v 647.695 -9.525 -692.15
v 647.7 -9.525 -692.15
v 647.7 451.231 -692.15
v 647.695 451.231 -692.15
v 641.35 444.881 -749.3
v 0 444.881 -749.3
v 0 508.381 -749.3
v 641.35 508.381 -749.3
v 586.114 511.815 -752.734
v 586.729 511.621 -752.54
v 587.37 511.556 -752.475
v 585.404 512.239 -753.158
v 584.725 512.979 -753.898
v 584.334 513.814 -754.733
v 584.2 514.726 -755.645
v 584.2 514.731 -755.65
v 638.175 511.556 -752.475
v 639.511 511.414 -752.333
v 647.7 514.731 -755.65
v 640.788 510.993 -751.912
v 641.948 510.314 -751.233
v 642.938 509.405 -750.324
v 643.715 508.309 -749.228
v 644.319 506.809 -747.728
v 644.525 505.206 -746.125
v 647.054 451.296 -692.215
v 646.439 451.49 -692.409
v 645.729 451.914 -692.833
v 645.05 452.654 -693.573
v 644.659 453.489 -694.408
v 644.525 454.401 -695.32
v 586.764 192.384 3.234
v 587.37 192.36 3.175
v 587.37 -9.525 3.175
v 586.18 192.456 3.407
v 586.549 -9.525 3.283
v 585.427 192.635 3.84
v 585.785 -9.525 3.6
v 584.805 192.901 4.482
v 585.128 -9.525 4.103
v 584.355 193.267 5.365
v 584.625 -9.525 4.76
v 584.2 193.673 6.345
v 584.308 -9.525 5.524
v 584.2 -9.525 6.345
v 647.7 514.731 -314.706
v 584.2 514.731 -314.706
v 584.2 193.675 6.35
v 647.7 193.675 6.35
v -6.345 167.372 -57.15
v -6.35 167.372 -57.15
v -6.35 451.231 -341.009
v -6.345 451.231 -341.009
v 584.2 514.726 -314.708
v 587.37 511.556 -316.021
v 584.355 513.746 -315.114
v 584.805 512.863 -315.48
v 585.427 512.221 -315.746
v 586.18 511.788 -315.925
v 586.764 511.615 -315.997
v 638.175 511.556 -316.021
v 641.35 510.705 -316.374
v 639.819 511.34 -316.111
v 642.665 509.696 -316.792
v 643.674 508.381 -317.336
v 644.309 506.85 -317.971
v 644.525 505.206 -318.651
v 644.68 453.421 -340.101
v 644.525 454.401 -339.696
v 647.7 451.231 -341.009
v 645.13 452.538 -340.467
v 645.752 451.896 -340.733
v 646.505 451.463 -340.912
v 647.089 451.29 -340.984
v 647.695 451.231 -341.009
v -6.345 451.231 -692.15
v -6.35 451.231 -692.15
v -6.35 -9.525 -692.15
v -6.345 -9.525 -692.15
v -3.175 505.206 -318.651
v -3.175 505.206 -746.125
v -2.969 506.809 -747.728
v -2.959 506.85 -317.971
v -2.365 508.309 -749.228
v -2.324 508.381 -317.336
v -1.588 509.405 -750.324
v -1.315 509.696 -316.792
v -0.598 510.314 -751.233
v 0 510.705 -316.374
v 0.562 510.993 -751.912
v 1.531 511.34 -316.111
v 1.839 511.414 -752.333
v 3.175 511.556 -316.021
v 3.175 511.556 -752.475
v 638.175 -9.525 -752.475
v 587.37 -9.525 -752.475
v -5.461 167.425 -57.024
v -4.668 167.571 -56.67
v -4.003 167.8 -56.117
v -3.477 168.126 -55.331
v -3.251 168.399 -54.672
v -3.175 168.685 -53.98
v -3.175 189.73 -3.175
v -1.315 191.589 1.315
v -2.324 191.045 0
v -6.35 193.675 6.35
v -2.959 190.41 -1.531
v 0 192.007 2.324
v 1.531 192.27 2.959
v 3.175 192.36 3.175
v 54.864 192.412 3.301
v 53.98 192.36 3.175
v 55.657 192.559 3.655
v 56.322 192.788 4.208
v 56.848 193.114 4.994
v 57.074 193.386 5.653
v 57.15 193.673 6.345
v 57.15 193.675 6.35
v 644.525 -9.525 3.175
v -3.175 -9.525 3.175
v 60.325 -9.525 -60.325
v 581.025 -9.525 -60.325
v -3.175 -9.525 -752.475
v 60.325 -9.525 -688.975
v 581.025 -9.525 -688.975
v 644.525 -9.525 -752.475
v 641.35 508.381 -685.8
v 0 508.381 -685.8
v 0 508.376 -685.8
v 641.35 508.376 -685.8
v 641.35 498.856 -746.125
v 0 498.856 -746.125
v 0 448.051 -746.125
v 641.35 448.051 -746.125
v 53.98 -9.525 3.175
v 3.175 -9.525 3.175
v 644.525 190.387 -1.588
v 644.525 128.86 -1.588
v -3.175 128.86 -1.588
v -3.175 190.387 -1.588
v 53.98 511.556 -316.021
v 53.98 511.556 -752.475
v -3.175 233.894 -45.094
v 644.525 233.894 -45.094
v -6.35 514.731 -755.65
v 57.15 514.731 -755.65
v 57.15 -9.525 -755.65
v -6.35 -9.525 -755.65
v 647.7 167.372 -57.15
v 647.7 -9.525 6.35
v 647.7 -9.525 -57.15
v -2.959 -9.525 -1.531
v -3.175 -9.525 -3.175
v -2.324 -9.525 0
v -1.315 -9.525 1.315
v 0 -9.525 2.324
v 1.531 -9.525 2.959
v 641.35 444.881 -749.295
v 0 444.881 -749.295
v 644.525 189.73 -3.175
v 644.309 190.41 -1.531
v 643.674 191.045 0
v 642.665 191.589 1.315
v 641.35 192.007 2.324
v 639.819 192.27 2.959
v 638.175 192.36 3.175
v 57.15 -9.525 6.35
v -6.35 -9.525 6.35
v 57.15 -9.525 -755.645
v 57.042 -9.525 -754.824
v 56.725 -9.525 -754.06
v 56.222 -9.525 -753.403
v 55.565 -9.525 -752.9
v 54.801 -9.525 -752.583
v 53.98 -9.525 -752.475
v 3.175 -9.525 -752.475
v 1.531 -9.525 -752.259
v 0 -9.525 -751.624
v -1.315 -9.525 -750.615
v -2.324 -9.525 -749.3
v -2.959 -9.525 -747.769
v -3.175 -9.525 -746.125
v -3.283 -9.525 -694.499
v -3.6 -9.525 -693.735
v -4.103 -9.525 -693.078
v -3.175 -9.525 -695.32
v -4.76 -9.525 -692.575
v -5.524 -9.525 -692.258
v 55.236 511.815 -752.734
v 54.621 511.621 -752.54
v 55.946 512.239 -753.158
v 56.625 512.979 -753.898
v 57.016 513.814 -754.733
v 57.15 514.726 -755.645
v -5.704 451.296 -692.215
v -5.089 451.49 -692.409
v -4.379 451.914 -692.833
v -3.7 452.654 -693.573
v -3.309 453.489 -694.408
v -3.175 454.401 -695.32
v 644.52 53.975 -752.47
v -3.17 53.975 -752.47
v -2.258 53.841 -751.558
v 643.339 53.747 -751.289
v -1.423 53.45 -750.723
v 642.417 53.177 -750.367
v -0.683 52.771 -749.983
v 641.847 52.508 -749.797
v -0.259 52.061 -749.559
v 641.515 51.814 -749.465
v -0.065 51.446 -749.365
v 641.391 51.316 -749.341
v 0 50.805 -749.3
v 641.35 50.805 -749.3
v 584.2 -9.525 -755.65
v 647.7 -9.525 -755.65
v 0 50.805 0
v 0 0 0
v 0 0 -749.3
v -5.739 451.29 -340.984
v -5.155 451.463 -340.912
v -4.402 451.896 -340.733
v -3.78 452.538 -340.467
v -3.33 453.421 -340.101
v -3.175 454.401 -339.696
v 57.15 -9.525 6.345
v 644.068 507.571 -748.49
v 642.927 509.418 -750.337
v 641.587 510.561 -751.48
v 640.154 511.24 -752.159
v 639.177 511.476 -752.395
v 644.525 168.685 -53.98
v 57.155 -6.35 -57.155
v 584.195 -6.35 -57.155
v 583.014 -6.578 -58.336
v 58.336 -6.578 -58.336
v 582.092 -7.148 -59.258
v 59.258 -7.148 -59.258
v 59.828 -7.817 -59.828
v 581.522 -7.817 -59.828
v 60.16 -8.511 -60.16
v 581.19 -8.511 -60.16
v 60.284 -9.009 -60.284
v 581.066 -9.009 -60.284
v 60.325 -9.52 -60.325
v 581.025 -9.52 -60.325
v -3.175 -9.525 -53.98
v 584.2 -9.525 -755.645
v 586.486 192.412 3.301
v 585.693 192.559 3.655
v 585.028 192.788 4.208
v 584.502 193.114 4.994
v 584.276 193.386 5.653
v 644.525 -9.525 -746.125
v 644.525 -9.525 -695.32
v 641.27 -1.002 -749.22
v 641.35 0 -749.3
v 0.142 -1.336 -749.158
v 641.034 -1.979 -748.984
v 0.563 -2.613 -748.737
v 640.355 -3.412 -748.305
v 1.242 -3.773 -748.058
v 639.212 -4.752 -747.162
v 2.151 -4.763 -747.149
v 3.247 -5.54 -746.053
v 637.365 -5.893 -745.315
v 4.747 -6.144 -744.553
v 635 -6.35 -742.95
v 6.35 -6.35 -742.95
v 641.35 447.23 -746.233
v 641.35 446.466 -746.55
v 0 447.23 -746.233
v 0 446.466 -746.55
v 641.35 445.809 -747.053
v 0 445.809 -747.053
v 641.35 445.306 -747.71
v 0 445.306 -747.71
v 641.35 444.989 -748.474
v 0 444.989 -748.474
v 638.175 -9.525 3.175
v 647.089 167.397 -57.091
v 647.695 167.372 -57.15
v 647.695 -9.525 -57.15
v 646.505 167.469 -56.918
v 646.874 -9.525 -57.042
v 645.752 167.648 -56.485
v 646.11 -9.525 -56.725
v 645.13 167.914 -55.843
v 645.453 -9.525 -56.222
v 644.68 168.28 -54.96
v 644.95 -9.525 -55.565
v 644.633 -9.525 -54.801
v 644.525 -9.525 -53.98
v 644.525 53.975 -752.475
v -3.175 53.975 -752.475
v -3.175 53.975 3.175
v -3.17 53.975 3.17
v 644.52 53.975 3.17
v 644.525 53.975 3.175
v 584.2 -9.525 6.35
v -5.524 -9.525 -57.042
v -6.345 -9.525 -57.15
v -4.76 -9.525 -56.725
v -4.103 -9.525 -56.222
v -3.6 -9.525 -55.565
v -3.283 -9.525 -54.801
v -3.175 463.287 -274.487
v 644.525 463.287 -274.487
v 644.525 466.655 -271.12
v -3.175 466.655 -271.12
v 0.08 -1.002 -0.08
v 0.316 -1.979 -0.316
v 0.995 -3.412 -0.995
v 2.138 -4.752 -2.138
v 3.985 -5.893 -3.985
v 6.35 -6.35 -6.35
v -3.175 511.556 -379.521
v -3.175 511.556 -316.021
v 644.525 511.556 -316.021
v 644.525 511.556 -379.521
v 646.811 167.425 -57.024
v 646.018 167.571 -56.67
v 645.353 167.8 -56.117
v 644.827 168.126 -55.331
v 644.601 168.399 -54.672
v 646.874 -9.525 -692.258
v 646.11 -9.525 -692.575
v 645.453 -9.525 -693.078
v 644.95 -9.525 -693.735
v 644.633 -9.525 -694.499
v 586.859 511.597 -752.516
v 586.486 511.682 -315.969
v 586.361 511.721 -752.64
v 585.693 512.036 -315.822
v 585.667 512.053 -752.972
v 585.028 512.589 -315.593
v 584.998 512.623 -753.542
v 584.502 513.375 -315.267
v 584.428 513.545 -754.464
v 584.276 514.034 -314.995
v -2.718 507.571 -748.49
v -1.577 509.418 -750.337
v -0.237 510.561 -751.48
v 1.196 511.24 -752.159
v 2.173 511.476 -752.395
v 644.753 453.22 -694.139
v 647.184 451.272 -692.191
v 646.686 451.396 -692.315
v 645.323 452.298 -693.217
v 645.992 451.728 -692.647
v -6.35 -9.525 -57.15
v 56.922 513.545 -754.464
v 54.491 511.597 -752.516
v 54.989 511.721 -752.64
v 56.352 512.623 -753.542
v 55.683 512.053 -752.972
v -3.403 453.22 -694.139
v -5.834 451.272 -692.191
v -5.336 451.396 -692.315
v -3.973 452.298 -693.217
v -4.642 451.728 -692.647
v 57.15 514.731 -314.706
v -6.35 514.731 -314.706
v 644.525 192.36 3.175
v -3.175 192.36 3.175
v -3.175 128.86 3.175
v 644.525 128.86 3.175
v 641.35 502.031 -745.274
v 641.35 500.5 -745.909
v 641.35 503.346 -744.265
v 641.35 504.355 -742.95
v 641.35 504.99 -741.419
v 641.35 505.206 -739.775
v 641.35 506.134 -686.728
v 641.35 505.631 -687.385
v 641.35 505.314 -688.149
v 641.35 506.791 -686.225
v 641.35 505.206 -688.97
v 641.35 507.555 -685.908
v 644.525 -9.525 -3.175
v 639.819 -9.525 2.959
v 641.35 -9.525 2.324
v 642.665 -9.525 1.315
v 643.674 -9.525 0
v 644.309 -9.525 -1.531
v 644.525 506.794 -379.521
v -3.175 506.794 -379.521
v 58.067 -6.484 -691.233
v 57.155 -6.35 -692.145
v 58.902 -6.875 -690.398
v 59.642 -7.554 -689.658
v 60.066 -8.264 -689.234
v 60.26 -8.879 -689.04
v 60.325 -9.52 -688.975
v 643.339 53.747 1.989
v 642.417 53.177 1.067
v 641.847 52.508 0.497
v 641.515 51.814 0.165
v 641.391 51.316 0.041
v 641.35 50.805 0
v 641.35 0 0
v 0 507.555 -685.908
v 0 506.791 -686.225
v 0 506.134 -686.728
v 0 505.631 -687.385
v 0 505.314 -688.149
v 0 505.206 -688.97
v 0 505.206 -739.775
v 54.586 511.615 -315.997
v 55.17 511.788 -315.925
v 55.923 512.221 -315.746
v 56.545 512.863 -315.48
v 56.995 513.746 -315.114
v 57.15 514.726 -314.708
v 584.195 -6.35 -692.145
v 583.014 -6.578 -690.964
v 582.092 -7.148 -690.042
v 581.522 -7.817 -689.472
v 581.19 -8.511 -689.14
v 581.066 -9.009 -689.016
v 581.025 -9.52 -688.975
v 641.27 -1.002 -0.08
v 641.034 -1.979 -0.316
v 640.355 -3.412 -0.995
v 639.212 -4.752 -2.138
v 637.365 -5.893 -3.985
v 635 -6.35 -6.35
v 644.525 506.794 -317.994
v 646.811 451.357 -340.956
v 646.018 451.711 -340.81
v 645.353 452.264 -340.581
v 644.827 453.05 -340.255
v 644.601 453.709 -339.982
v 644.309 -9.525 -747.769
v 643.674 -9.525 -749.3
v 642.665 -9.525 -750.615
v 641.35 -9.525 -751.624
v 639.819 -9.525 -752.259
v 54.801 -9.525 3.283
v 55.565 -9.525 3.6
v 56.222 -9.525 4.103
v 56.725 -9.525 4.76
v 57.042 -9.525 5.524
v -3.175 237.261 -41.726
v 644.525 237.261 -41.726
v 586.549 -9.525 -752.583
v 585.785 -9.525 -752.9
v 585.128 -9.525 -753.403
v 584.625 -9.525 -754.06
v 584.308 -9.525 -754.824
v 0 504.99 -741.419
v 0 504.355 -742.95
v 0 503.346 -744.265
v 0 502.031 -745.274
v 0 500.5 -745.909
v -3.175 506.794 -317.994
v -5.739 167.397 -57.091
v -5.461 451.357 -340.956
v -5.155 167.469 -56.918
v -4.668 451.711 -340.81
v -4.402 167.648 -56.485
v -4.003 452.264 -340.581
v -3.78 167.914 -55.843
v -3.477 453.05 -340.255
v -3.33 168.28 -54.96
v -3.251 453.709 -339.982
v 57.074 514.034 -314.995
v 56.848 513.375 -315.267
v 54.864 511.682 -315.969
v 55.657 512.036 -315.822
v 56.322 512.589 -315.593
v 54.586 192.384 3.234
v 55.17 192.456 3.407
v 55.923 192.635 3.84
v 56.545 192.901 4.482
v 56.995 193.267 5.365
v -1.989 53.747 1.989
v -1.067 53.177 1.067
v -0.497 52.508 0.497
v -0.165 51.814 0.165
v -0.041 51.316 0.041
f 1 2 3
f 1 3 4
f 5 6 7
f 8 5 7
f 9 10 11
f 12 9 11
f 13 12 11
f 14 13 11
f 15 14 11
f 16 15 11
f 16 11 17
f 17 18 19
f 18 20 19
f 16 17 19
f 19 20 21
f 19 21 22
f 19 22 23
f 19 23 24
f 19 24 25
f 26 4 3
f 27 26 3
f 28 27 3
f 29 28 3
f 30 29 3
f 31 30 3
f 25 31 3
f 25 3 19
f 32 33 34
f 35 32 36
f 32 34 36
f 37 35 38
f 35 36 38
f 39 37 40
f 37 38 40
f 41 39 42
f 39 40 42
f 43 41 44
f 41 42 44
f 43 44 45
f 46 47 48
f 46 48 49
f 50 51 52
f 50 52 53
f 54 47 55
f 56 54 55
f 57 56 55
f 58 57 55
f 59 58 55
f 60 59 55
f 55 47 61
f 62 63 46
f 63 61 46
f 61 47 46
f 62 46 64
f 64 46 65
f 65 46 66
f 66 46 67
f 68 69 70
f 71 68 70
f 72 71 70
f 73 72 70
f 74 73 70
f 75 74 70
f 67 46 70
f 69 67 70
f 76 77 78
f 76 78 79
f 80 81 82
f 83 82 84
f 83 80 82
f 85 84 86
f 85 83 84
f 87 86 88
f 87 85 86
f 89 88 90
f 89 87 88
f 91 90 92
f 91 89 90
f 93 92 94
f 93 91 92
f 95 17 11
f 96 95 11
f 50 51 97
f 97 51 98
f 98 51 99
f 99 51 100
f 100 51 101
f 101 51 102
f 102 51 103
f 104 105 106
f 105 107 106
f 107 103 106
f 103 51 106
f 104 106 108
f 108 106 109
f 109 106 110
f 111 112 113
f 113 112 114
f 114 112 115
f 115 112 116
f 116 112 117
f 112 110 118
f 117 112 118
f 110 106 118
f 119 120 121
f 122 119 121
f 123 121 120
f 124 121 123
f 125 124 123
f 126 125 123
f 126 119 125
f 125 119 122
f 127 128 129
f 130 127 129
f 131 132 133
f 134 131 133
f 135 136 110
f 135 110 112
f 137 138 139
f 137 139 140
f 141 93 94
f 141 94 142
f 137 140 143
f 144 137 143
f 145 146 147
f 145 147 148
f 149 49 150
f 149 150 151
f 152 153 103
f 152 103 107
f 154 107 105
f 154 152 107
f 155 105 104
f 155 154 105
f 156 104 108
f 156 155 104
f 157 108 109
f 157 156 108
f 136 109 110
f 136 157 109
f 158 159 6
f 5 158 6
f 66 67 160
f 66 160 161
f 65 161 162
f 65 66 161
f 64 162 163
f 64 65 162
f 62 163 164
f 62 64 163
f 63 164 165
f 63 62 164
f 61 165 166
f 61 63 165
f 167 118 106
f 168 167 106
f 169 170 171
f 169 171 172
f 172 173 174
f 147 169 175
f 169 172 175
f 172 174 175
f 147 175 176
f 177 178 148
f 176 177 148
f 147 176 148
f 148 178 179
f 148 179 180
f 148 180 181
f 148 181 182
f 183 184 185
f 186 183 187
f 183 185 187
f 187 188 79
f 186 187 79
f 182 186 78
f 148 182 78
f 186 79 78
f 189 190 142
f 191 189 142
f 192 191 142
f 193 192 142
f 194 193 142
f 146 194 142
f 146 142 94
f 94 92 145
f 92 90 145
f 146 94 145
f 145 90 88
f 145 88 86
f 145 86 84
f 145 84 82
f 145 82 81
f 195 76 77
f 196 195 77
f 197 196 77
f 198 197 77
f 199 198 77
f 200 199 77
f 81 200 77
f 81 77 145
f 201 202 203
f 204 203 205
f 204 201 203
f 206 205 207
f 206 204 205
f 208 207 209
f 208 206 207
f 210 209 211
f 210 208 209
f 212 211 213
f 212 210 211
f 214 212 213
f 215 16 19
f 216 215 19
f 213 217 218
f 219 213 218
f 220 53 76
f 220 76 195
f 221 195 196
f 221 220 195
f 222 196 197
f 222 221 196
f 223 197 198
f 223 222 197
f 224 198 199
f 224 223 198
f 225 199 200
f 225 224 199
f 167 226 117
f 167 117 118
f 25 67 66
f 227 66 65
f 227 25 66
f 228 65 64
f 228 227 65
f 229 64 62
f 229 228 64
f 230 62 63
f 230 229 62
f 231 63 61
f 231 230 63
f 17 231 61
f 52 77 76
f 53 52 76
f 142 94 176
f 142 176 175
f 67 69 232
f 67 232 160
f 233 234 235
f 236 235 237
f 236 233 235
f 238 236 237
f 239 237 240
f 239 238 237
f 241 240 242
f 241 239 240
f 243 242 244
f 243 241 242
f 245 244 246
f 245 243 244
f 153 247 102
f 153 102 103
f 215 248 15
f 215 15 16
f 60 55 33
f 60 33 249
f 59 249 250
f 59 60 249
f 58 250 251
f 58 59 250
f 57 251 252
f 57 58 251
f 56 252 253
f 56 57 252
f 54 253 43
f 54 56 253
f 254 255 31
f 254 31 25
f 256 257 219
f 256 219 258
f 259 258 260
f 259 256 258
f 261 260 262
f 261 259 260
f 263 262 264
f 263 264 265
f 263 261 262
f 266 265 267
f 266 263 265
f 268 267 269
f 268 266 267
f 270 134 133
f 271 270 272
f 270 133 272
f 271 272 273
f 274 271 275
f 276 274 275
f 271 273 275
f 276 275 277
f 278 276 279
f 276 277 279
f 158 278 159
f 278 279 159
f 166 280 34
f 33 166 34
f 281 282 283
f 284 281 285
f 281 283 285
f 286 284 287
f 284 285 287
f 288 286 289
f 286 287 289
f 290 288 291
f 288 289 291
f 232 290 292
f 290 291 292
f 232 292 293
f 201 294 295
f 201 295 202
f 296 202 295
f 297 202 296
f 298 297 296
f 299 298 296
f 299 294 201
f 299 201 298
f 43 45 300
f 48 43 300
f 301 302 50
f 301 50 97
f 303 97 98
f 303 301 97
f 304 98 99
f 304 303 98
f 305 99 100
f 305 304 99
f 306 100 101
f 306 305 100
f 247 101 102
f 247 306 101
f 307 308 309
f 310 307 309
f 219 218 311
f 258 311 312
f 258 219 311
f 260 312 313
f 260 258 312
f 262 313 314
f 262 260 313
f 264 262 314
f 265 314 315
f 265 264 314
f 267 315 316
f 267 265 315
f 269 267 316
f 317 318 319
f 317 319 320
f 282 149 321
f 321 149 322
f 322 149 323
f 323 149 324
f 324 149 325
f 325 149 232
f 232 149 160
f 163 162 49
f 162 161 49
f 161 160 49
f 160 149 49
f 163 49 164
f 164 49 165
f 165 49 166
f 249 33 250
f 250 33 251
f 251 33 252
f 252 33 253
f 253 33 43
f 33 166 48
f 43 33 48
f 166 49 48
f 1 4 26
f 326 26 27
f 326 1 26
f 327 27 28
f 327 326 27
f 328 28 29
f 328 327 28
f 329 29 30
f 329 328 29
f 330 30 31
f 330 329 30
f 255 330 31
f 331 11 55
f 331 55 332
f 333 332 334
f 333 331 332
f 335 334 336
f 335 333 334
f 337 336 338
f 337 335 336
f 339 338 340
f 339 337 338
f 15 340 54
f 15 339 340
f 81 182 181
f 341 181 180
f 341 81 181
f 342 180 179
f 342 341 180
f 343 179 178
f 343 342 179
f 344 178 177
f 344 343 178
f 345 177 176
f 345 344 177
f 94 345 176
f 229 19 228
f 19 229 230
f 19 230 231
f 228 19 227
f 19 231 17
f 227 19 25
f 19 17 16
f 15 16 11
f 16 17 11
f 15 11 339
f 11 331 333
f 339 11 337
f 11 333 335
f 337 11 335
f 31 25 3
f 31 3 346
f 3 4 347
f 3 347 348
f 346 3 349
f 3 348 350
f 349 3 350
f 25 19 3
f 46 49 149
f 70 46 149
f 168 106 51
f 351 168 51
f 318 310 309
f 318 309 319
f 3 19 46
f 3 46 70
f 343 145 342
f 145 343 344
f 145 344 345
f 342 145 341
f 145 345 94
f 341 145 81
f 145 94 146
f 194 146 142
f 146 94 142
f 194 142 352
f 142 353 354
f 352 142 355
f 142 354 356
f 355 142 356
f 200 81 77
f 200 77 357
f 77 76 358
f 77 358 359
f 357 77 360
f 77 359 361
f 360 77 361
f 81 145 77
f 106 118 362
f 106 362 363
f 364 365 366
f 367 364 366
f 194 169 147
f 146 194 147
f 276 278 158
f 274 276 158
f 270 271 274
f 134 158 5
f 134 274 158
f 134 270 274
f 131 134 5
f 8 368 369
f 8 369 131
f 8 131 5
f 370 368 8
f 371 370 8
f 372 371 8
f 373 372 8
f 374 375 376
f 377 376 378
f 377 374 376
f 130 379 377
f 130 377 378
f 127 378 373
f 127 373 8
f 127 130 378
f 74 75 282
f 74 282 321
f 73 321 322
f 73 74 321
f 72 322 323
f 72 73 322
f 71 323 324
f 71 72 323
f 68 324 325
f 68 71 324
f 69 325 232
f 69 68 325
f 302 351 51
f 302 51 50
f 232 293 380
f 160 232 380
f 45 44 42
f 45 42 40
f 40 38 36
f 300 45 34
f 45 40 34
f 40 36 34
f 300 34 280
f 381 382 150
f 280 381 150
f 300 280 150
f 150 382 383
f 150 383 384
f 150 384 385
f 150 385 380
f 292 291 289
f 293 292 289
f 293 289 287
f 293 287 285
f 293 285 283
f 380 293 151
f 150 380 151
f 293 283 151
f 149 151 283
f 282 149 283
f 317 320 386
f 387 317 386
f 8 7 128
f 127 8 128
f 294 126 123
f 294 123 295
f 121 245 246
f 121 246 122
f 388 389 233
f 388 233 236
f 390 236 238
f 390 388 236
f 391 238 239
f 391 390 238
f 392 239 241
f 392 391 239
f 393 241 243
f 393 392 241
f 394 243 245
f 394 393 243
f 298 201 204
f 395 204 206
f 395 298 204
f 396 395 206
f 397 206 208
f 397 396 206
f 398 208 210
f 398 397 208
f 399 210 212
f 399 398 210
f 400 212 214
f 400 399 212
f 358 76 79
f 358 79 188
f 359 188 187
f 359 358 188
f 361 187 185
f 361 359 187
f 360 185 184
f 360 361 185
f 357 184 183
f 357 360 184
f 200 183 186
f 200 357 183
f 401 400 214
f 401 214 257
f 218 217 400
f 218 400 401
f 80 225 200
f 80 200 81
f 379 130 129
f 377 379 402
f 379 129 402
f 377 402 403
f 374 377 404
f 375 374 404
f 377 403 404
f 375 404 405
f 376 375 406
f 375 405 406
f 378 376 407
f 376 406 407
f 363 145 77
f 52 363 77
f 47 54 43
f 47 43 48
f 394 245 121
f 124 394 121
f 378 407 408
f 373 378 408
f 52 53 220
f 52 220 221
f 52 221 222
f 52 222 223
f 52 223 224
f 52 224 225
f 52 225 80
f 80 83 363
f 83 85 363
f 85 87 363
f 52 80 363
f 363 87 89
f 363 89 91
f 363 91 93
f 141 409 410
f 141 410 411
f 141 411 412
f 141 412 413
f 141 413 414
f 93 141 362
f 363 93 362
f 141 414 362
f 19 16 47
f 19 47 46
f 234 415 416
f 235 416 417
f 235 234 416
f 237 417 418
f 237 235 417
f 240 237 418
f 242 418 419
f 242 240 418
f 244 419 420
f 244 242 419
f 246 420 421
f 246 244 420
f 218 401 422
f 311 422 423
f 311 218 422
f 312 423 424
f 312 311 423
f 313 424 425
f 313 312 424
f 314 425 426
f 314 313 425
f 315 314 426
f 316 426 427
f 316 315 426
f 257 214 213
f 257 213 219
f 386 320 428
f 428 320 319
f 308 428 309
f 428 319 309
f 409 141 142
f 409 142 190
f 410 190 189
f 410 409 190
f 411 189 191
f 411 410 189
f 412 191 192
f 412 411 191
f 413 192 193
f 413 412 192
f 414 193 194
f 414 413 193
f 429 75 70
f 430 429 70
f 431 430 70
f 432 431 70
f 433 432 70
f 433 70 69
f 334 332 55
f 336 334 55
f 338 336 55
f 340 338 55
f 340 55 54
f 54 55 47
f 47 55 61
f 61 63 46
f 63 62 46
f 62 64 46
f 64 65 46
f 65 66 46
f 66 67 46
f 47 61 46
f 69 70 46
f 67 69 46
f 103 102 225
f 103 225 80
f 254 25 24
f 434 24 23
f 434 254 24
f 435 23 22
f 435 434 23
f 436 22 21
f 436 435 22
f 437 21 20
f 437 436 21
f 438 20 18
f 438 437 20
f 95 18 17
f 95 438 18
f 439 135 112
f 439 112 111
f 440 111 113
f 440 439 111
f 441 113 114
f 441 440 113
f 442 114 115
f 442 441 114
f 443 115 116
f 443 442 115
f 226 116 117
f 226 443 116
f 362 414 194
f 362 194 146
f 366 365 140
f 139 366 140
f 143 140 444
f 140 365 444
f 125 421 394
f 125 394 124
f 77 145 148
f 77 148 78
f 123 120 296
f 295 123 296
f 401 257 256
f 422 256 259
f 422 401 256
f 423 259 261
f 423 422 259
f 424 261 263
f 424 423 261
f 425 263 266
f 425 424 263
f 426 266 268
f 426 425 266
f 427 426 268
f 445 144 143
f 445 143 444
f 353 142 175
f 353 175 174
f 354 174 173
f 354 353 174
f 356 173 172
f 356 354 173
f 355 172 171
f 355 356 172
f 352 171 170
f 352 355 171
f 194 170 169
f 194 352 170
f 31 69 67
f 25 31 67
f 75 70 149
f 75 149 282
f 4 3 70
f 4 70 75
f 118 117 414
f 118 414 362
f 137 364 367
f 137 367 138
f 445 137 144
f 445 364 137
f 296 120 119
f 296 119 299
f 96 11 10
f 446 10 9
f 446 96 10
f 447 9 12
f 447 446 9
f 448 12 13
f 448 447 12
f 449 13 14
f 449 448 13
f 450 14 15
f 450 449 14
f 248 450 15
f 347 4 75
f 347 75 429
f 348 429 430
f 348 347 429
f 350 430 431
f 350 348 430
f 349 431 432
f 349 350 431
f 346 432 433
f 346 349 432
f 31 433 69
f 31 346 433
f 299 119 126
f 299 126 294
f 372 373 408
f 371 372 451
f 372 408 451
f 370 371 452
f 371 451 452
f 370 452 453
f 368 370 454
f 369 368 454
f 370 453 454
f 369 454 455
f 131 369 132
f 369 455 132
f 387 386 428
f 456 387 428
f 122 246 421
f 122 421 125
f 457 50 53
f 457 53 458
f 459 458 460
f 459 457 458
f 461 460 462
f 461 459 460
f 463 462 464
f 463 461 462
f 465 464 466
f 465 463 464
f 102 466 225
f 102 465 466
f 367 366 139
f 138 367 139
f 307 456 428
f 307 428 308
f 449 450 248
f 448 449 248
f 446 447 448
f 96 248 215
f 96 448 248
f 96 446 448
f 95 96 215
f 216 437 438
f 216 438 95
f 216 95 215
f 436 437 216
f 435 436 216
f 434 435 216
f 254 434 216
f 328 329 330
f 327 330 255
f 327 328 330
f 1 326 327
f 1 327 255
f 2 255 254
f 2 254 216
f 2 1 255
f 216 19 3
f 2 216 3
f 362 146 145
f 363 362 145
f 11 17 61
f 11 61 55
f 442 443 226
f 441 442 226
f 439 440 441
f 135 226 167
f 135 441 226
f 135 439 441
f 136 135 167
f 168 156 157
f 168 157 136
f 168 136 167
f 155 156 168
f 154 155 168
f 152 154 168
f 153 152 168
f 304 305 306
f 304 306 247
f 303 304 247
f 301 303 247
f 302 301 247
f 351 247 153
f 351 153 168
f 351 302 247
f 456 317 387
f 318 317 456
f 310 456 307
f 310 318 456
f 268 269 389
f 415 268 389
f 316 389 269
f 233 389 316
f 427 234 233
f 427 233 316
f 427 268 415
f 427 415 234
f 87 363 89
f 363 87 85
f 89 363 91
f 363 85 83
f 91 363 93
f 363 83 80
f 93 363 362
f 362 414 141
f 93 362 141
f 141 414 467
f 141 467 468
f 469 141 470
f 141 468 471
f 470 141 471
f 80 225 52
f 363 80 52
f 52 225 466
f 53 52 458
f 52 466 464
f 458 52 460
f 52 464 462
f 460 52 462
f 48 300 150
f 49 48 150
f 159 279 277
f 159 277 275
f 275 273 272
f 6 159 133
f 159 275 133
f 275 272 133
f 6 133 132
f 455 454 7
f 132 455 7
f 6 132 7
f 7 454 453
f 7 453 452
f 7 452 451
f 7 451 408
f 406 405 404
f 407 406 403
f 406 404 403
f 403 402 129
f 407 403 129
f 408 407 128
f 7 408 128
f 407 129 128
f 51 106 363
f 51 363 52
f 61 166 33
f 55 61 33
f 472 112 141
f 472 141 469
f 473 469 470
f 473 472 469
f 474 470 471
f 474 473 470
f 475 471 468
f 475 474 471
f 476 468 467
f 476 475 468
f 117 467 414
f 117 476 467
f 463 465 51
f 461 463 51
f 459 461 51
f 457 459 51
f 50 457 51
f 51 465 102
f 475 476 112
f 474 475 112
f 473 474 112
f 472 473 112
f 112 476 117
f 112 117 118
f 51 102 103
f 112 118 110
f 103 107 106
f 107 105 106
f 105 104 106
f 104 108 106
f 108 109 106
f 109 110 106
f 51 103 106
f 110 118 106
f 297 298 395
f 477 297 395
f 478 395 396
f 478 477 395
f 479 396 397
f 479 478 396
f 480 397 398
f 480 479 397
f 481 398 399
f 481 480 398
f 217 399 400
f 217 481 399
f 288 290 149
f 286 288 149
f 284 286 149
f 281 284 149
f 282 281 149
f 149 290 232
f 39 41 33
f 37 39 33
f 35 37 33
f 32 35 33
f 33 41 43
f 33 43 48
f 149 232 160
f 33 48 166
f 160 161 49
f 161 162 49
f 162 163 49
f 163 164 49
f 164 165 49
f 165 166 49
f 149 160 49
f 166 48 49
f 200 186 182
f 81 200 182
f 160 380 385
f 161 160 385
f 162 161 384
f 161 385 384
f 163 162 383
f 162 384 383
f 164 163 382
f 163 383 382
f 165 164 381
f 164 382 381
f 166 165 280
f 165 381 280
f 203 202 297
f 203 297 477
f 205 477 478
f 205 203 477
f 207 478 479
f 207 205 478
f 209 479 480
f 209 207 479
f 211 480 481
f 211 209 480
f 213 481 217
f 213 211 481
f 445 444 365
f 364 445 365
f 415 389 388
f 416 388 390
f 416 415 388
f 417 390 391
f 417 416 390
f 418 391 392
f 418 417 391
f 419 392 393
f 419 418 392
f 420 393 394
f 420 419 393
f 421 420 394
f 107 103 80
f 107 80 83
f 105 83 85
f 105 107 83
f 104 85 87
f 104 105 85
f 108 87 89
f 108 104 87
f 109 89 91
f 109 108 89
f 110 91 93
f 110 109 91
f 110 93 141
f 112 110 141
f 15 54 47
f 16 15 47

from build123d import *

# Parameters (mm, degrees)
NGULO_DE_EXTREMOS_REDONDEADOS_AL_I_AL_L_DEPTH      = 850.142792782
NGULO_DE_EXTREMOS_REDONDEADOS_AL_I_AL_L_DEPTH_BACK = 100.842792782
NGULO_DE_EXTREMOS_REDONDEADOS_AL_I_A_4_DEPTH       = 843.035585563
NGULO_DE_EXTREMOS_REDONDEADOS_AL_I_A_6_DEPTH       = 950.985585563
NGULO_DE_EXTREMOS_REDONDEADOS_AL_I_A_8_DEPTH       = 843.035585563
NGULO_DE_EXTREMOS_REDONDEADOS_AL_I_A_11_DEPTH      = 241.397438789
NGULO_DE_EXTREMOS_REDONDEADOS_AL_I_A_13_DEPTH      = 530.43662706
NGULO_DE_EXTREMOS_REDONDEADOS_AL_I_A_16_DEPTH      = 569.944
NGULO_DE_EXTREMOS_REDONDEADOS_AL_I_A_19_DEPTH      = 615.058561211
NGULO_DE_EXTREMOS_REDONDEADOS_AL_I_A_21_DEPTH      = 241.397438789
NGULO_DE_EXTREMOS_REDONDEADOS_AL_I_A_23_DEPTH      = 530.43662706
NGULO_DE_EXTREMOS_REDONDEADOS_AL_I_A_26_DEPTH      = 569.944
NGULO_DE_EXTREMOS_REDONDEADOS_AL_I_A_29_DEPTH      = 615.058561211
SALIENTE_EXTRUIR1_DEPTH                            = 647.7
SALIENTE_EXTRUIR1_2_DEPTH                          = 647.7
NGULO_DE_EXTREMOS_REDONDEADOS_AL_I_A_31_DEPTH      = 641.35


with BuildPart() as part:
    # Sketch1 → ngulo de extremos redondeados al i AL L (new, two sides: drawn at the far end of the back side and taken through both)
    with BuildSketch(Plane(origin=(-3.175, -9.525, -749.3), x_dir=(1, 0, 0), z_dir=(0, 0, 1)).offset(-NGULO_DE_EXTREMOS_REDONDEADOS_AL_I_AL_L_DEPTH_BACK)):
        with BuildLine():
            Line((0, 0), (0, 63.5))
            Line((0, 63.5), (0.00508, 63.5))
            ThreePointArc((0.00508, 63.5), (2.246551928, 62.571551928), (3.175, 60.33008))
            Line((3.175, 60.33008), (3.175, 9.525))
            ThreePointArc((3.175, 9.525), (5.034871939, 5.034871939), (9.525, 3.175))
            Line((9.525, 3.175), (60.33008, 3.175))
            ThreePointArc((60.33008, 3.175), (62.571551928, 2.246551928), (63.5, 0.00508))
            Line((63.5, 0.00508), (63.5, 0))
            Line((63.5, 0), (0, 0))
        make_face()
    extrude(amount=NGULO_DE_EXTREMOS_REDONDEADOS_AL_I_AL_L_DEPTH + NGULO_DE_EXTREMOS_REDONDEADOS_AL_I_AL_L_DEPTH_BACK)

    # ngulo de extremos redondeados al i A 2
    split(bisect_by=Plane(origin=(0, 0, -749.3), x_dir=(0, -1, 0), z_dir=(-0.707106781, 0, 0.707106781)), keep=Keep.TOP)

    # ngulo de extremos redondeados al i A 3
    split(bisect_by=Plane(origin=(0, 0, 0), x_dir=(0, -1, 0), z_dir=(-0.707106781, 0, -0.707106781)), keep=Keep.TOP)


with BuildPart() as body_2:
    # Sketch1 on segment 2 (carried to segment 2) → ngulo de extremos redondeados al i A 4 (new body)
    with BuildSketch(Plane(origin=(-100.842792782, -9.525, 3.175), x_dir=(0, 0, -1), z_dir=(1, 0, 0))):
        with BuildLine():
            Line((0, 0), (0, 63.5))
            Line((0, 63.5), (0.00508, 63.5))
            ThreePointArc((0.00508, 63.5), (2.246551928, 62.571551928), (3.175, 60.33008))
            Line((3.175, 60.33008), (3.175, 9.525))
            ThreePointArc((3.175, 9.525), (5.034871939, 5.034871939), (9.525, 3.175))
            Line((9.525, 3.175), (60.33008, 3.175))
            ThreePointArc((60.33008, 3.175), (62.571551928, 2.246551928), (63.5, 0.00508))
            Line((63.5, 0.00508), (63.5, 0))
            Line((63.5, 0), (0, 0))
        make_face()
    extrude(amount=NGULO_DE_EXTREMOS_REDONDEADOS_AL_I_A_4_DEPTH)

    # ngulo de extremos redondeados al i A 4 m
    split(bisect_by=Plane(origin=(641.35, 0, 0), x_dir=(0, -1, 0), z_dir=(-0.707106781, 0, 0.707106781)), keep=Keep.TOP)

    # ngulo de extremos redondeados al i A 5
    split(bisect_by=Plane(origin=(0, 0, 0), x_dir=(0, 1, 0), z_dir=(0.707106781, 0, 0.707106781)), keep=Keep.TOP)


with BuildPart() as body_3:
    # Sketch1 on segment 3 (carried to segment 3) → ngulo de extremos redondeados al i A 6 (new body)
    with BuildSketch(Plane(origin=(644.525, -9.525, 100.842792782), x_dir=(-1, 0, 0), z_dir=(0, 0, -1))):
        with BuildLine():
            Line((0, 0), (0, 63.5))
            Line((0, 63.5), (0.00508, 63.5))
            ThreePointArc((0.00508, 63.5), (2.246551928, 62.571551928), (3.175, 60.33008))
            Line((3.175, 60.33008), (3.175, 9.525))
            ThreePointArc((3.175, 9.525), (5.034871939, 5.034871939), (9.525, 3.175))
            Line((9.525, 3.175), (60.33008, 3.175))
            ThreePointArc((60.33008, 3.175), (62.571551928, 2.246551928), (63.5, 0.00508))
            Line((63.5, 0.00508), (63.5, 0))
            Line((63.5, 0), (0, 0))
        make_face()
    extrude(amount=NGULO_DE_EXTREMOS_REDONDEADOS_AL_I_A_6_DEPTH)

    # ngulo de extremos redondeados al i A 6 m
    split(bisect_by=Plane(origin=(641.35, 0, 0), x_dir=(0, 1, 0), z_dir=(0.707106781, 0, -0.707106781)), keep=Keep.TOP)

    # ngulo de extremos redondeados al i A 7
    split(bisect_by=Plane(origin=(641.35, 0, -749.3), x_dir=(0, 1, 0), z_dir=(0.707106781, 0, 0.707106781)), keep=Keep.TOP)


with BuildPart() as body_4:
    # Sketch1 on segment 4 (carried to segment 4) → ngulo de extremos redondeados al i A 8 (new body)
    with BuildSketch(Plane(origin=(742.192792782, -9.525, -752.475), x_dir=(0, 0, 1), z_dir=(-1, 0, 0))):
        with BuildLine():
            Line((0, 0), (0, 63.5))
            Line((0, 63.5), (0.00508, 63.5))
            ThreePointArc((0.00508, 63.5), (2.246551928, 62.571551928), (3.175, 60.33008))
            Line((3.175, 60.33008), (3.175, 9.525))
            ThreePointArc((3.175, 9.525), (5.034871939, 5.034871939), (9.525, 3.175))
            Line((9.525, 3.175), (60.33008, 3.175))
            ThreePointArc((60.33008, 3.175), (62.571551928, 2.246551928), (63.5, 0.00508))
            Line((63.5, 0.00508), (63.5, 0))
            Line((63.5, 0), (0, 0))
        make_face()
    extrude(amount=NGULO_DE_EXTREMOS_REDONDEADOS_AL_I_A_8_DEPTH)

    # ngulo de extremos redondeados al i A 8 m
    split(bisect_by=Plane(origin=(641.35, 0, -749.3), x_dir=(0, -1, 0), z_dir=(-0.707106781, 0, -0.707106781)), keep=Keep.TOP)

    # ngulo de extremos redondeados al i A 9
    split(bisect_by=Plane(origin=(0, 0, -749.3), x_dir=(0, 1, 0), z_dir=(0.707106781, 0, -0.707106781)), keep=Keep.TOP)


with BuildPart() as part_1:
    add(part.part)

    # ngulo de extremos redondeados al i A 10: union body 2, body 3, body 4
    add(body_2.part)
    add(body_3.part)
    add(body_4.part)


with BuildPart() as body_2_2:
    # Sketch12 → ngulo de extremos redondeados al i A 11 (new body)
    with BuildSketch(Plane(origin=(647.7, -9.525, 6.35), x_dir=(-1, 0, 0), z_dir=(0, -1, 0))):
        with BuildLine():
            Line((0, 0), (0, 63.5))
            Line((0, 63.5), (0.00508, 63.5))
            ThreePointArc((0.00508, 63.5), (2.246551928, 62.571551928), (3.175, 60.33008))
            Line((3.175, 60.33008), (3.175, 9.525))
            ThreePointArc((3.175, 9.525), (5.034871939, 5.034871939), (9.525, 3.175))
            Line((9.525, 3.175), (60.33008, 3.175))
            ThreePointArc((60.33008, 3.175), (62.571551928, 2.246551928), (63.5, 0.00508))
            Line((63.5, 0.00508), (63.5, 0))
            Line((63.5, 0), (0, 0))
        make_face()
    extrude(amount=-NGULO_DE_EXTREMOS_REDONDEADOS_AL_I_A_11_DEPTH)

    # ngulo de extremos redondeados al i A 12
    split(bisect_by=Plane(origin=(647.7, 193.675, 6.35), x_dir=(1, 0, 0), z_dir=(0, -0.923879533, 0.382683432)), keep=Keep.TOP)


with BuildPart() as body_3_2:
    # Sketch12 on segment 2 (carried to segment 2) → ngulo de extremos redondeados al i A 13 (new body)
    with BuildSketch(Plane(origin=(647.7, 541.740667992, -341.715667992), x_dir=(-1, 0, 0), z_dir=(0, -0.707106781, 0.707106781))):
        with BuildLine():
            Line((0, 0), (0, 63.5))
            Line((0, 63.5), (0.00508, 63.5))
            ThreePointArc((0.00508, 63.5), (2.246551928, 62.571551928), (3.175, 60.33008))
            Line((3.175, 60.33008), (3.175, 9.525))
            ThreePointArc((3.175, 9.525), (5.034871939, 5.034871939), (9.525, 3.175))
            Line((9.525, 3.175), (60.33008, 3.175))
            ThreePointArc((60.33008, 3.175), (62.571551928, 2.246551928), (63.5, 0.00508))
            Line((63.5, 0.00508), (63.5, 0))
            Line((63.5, 0), (0, 0))
        make_face()
    extrude(amount=NGULO_DE_EXTREMOS_REDONDEADOS_AL_I_A_13_DEPTH)

    # ngulo de extremos redondeados al i A 14
    split(bisect_by=Plane(origin=(647.7, 193.675, 6.35), x_dir=(-1, 0, 0), z_dir=(0, 0.923879533, -0.382683432)), keep=Keep.TOP)

    # ngulo de extremos redondeados al i A 15
    split(bisect_by=Plane(origin=(647.7, 514.731, -314.706), x_dir=(0, -0.923879533, -0.382683432), z_dir=(0, -0.382683432, 0.923879533)), keep=Keep.TOP)


with BuildPart() as body_4_2:
    # Sketch12 on segment 3 (carried to segment 3) → ngulo de extremos redondeados al i A 16 (new body)
    with BuildSketch(Plane(origin=(647.7, 514.731, -846.452561211), x_dir=(-1, 0, 0), z_dir=(0, 0, 1))):
        with BuildLine():
            Line((0, 0), (0, 63.5))
            Line((0, 63.5), (0.00508, 63.5))
            ThreePointArc((0.00508, 63.5), (2.246551928, 62.571551928), (3.175, 60.33008))
            Line((3.175, 60.33008), (3.175, 9.525))
            ThreePointArc((3.175, 9.525), (5.034871939, 5.034871939), (9.525, 3.175))
            Line((9.525, 3.175), (60.33008, 3.175))
            ThreePointArc((60.33008, 3.175), (62.571551928, 2.246551928), (63.5, 0.00508))
            Line((63.5, 0.00508), (63.5, 0))
            Line((63.5, 0), (0, 0))
        make_face()
    extrude(amount=NGULO_DE_EXTREMOS_REDONDEADOS_AL_I_A_16_DEPTH)

    # ngulo de extremos redondeados al i A 17
    split(bisect_by=Plane(origin=(647.7, 514.731, -314.706), x_dir=(0, 0.923879533, 0.382683432), z_dir=(0, 0.382683432, -0.923879533)), keep=Keep.TOP)

    # ngulo de extremos redondeados al i A 18
    split(bisect_by=Plane(origin=(647.7, 514.731, -755.65), x_dir=(-1, 0, 0), z_dir=(0, 0.707106781, 0.707106781)), keep=Keep.TOP)


with BuildPart() as body_5:
    # Sketch12 on segment 4 (carried to segment 4) → ngulo de extremos redondeados al i A 19 (new body)
    with BuildSketch(Plane(origin=(647.7, -9.525, -755.65), x_dir=(-1, 0, 0), z_dir=(0, 1, 0))):
        with BuildLine():
            Line((0, 0), (0, 63.5))
            Line((0, 63.5), (0.00508, 63.5))
            ThreePointArc((0.00508, 63.5), (2.246551928, 62.571551928), (3.175, 60.33008))
            Line((3.175, 60.33008), (3.175, 9.525))
            ThreePointArc((3.175, 9.525), (5.034871939, 5.034871939), (9.525, 3.175))
            Line((9.525, 3.175), (60.33008, 3.175))
            ThreePointArc((60.33008, 3.175), (62.571551928, 2.246551928), (63.5, 0.00508))
            Line((63.5, 0.00508), (63.5, 0))
            Line((63.5, 0), (0, 0))
        make_face()
    extrude(amount=NGULO_DE_EXTREMOS_REDONDEADOS_AL_I_A_19_DEPTH)

    # ngulo de extremos redondeados al i A 20
    split(bisect_by=Plane(origin=(647.7, 514.731, -755.65), x_dir=(1, 0, 0), z_dir=(0, -0.707106781, -0.707106781)), keep=Keep.TOP)


with BuildPart() as body_6:
    # Sketch17 → ngulo de extremos redondeados al i A 21 (new body)
    with BuildSketch(Plane(origin=(-6.35, -9.525, 6.35), x_dir=(1, 0, 0), z_dir=(0, 1, 0))):
        with BuildLine():
            Line((0, 0), (0, 63.5))
            Line((0, 63.5), (0.00508, 63.5))
            ThreePointArc((0.00508, 63.5), (2.246551928, 62.571551928), (3.175, 60.33008))
            Line((3.175, 60.33008), (3.175, 9.525))
            ThreePointArc((3.175, 9.525), (5.034871939, 5.034871939), (9.525, 3.175))
            Line((9.525, 3.175), (60.33008, 3.175))
            ThreePointArc((60.33008, 3.175), (62.571551928, 2.246551928), (63.5, 0.00508))
            Line((63.5, 0.00508), (63.5, 0))
            Line((63.5, 0), (0, 0))
        make_face()
    extrude(amount=NGULO_DE_EXTREMOS_REDONDEADOS_AL_I_A_21_DEPTH)

    # ngulo de extremos redondeados al i A 22
    split(bisect_by=Plane(origin=(-6.35, 193.675, 6.35), x_dir=(1, 0, 0), z_dir=(0, -0.923879533, 0.382683432)), keep=Keep.TOP)


with BuildPart() as body_7:
    # Sketch17 on segment 2 (carried to segment 2) → ngulo de extremos redondeados al i A 23 (new body)
    with BuildSketch(Plane(origin=(-6.35, 166.665332008, 33.359667992), x_dir=(1, 0, 0), z_dir=(0, 0.707106781, -0.707106781))):
        with BuildLine():
            Line((0, 0), (0, 63.5))
            Line((0, 63.5), (0.00508, 63.5))
            ThreePointArc((0.00508, 63.5), (2.246551928, 62.571551928), (3.175, 60.33008))
            Line((3.175, 60.33008), (3.175, 9.525))
            ThreePointArc((3.175, 9.525), (5.034871939, 5.034871939), (9.525, 3.175))
            Line((9.525, 3.175), (60.33008, 3.175))
            ThreePointArc((60.33008, 3.175), (62.571551928, 2.246551928), (63.5, 0.00508))
            Line((63.5, 0.00508), (63.5, 0))
            Line((63.5, 0), (0, 0))
        make_face()
    extrude(amount=NGULO_DE_EXTREMOS_REDONDEADOS_AL_I_A_23_DEPTH)

    # ngulo de extremos redondeados al i A 24
    split(bisect_by=Plane(origin=(-6.35, 193.675, 6.35), x_dir=(-1, 0, 0), z_dir=(0, 0.923879533, -0.382683432)), keep=Keep.TOP)

    # ngulo de extremos redondeados al i A 25
    split(bisect_by=Plane(origin=(-6.35, 514.731, -314.706), x_dir=(0, -0.923879533, -0.382683432), z_dir=(0, -0.382683432, 0.923879533)), keep=Keep.TOP)


with BuildPart() as body_8:
    # Sketch17 on segment 3 (carried to segment 3) → ngulo de extremos redondeados al i A 26 (new body)
    with BuildSketch(Plane(origin=(-6.35, 514.731, -276.508561211), x_dir=(1, 0, 0), z_dir=(0, 0, -1))):
        with BuildLine():
            Line((0, 0), (0, 63.5))
            Line((0, 63.5), (0.00508, 63.5))
            ThreePointArc((0.00508, 63.5), (2.246551928, 62.571551928), (3.175, 60.33008))
            Line((3.175, 60.33008), (3.175, 9.525))
            ThreePointArc((3.175, 9.525), (5.034871939, 5.034871939), (9.525, 3.175))
            Line((9.525, 3.175), (60.33008, 3.175))
            ThreePointArc((60.33008, 3.175), (62.571551928, 2.246551928), (63.5, 0.00508))
            Line((63.5, 0.00508), (63.5, 0))
            Line((63.5, 0), (0, 0))
        make_face()
    extrude(amount=NGULO_DE_EXTREMOS_REDONDEADOS_AL_I_A_26_DEPTH)

    # ngulo de extremos redondeados al i A 27
    split(bisect_by=Plane(origin=(-6.35, 514.731, -314.706), x_dir=(0, 0.923879533, 0.382683432), z_dir=(0, 0.382683432, -0.923879533)), keep=Keep.TOP)

    # ngulo de extremos redondeados al i A 28
    split(bisect_by=Plane(origin=(-6.35, 514.731, -755.65), x_dir=(-1, 0, 0), z_dir=(0, 0.707106781, 0.707106781)), keep=Keep.TOP)


with BuildPart() as body_9:
    # Sketch17 on segment 4 (carried to segment 4) → ngulo de extremos redondeados al i A 29 (new body)
    with BuildSketch(Plane(origin=(-6.35, 605.533561211, -755.65), x_dir=(1, 0, 0), z_dir=(0, -1, 0))):
        with BuildLine():
            Line((0, 0), (0, 63.5))
            Line((0, 63.5), (0.00508, 63.5))
            ThreePointArc((0.00508, 63.5), (2.246551928, 62.571551928), (3.175, 60.33008))
            Line((3.175, 60.33008), (3.175, 9.525))
            ThreePointArc((3.175, 9.525), (5.034871939, 5.034871939), (9.525, 3.175))
            Line((9.525, 3.175), (60.33008, 3.175))
            ThreePointArc((60.33008, 3.175), (62.571551928, 2.246551928), (63.5, 0.00508))
            Line((63.5, 0.00508), (63.5, 0))
            Line((63.5, 0), (0, 0))
        make_face()
    extrude(amount=NGULO_DE_EXTREMOS_REDONDEADOS_AL_I_A_29_DEPTH)

    # ngulo de extremos redondeados al i A 30
    split(bisect_by=Plane(origin=(-6.35, 514.731, -755.65), x_dir=(1, 0, 0), z_dir=(0, -0.707106781, -0.707106781)), keep=Keep.TOP)


with BuildPart() as body_10:
    # Croquis2 → Saliente-Extruir1 (new body)
    with BuildSketch(Plane(origin=(-3.175, 0, 0), x_dir=(0, 0, -1), z_dir=(1, 0, 0))):
        Polygon((-3.175, 192.359871939), (-3.175, 128.859871939), (1.5875, 128.859871939), (1.5875, 190.387179849), (45.093876651, 233.893556499), (41.726280605, 237.261152545), align=None)
    extrude(amount=SALIENTE_EXTRUIR1_DEPTH)


with BuildPart() as body_11:
    # Croquis2 → Saliente-Extruir1 2 (new body)
    with BuildSketch(Plane(origin=(-3.175, 0, 0), x_dir=(0, 0, -1), z_dir=(1, 0, 0))):
        Polygon((316.021128061, 511.556), (379.521128061, 511.556), (379.521128061, 506.7935), (317.993820151, 506.7935), (274.487443501, 463.287123349), (271.119847455, 466.654719395), align=None)
    extrude(amount=SALIENTE_EXTRUIR1_2_DEPTH)


with BuildPart() as body_12:
    # Sketch110 → ngulo de extremos redondeados al i A 31 (new body)
    with BuildSketch(Plane(origin=(0, 508.381, -749.3), x_dir=(0, -1, 0), z_dir=(-1, 0, 0))):
        with BuildLine():
            Line((0, 0), (0, 63.5))
            Line((0, 63.5), (0.00508, 63.5))
            ThreePointArc((0.00508, 63.5), (2.246551928, 62.571551928), (3.175, 60.33008))
            Line((3.175, 60.33008), (3.175, 9.525))
            ThreePointArc((3.175, 9.525), (5.034871939, 5.034871939), (9.525, 3.175))
            Line((9.525, 3.175), (60.33008, 3.175))
            ThreePointArc((60.33008, 3.175), (62.571551928, 2.246551928), (63.5, 0.00508))
            Line((63.5, 0.00508), (63.5, 0))
            Line((63.5, 0), (0, 0))
        make_face()
    extrude(amount=-NGULO_DE_EXTREMOS_REDONDEADOS_AL_I_A_31_DEPTH)


solid = Compound([part_1.part, body_2_2.part, body_3_2.part, body_4_2.part, body_5.part, body_6.part, body_7.part, body_8.part, body_9.part, body_10.part, body_11.part, body_12.part])
